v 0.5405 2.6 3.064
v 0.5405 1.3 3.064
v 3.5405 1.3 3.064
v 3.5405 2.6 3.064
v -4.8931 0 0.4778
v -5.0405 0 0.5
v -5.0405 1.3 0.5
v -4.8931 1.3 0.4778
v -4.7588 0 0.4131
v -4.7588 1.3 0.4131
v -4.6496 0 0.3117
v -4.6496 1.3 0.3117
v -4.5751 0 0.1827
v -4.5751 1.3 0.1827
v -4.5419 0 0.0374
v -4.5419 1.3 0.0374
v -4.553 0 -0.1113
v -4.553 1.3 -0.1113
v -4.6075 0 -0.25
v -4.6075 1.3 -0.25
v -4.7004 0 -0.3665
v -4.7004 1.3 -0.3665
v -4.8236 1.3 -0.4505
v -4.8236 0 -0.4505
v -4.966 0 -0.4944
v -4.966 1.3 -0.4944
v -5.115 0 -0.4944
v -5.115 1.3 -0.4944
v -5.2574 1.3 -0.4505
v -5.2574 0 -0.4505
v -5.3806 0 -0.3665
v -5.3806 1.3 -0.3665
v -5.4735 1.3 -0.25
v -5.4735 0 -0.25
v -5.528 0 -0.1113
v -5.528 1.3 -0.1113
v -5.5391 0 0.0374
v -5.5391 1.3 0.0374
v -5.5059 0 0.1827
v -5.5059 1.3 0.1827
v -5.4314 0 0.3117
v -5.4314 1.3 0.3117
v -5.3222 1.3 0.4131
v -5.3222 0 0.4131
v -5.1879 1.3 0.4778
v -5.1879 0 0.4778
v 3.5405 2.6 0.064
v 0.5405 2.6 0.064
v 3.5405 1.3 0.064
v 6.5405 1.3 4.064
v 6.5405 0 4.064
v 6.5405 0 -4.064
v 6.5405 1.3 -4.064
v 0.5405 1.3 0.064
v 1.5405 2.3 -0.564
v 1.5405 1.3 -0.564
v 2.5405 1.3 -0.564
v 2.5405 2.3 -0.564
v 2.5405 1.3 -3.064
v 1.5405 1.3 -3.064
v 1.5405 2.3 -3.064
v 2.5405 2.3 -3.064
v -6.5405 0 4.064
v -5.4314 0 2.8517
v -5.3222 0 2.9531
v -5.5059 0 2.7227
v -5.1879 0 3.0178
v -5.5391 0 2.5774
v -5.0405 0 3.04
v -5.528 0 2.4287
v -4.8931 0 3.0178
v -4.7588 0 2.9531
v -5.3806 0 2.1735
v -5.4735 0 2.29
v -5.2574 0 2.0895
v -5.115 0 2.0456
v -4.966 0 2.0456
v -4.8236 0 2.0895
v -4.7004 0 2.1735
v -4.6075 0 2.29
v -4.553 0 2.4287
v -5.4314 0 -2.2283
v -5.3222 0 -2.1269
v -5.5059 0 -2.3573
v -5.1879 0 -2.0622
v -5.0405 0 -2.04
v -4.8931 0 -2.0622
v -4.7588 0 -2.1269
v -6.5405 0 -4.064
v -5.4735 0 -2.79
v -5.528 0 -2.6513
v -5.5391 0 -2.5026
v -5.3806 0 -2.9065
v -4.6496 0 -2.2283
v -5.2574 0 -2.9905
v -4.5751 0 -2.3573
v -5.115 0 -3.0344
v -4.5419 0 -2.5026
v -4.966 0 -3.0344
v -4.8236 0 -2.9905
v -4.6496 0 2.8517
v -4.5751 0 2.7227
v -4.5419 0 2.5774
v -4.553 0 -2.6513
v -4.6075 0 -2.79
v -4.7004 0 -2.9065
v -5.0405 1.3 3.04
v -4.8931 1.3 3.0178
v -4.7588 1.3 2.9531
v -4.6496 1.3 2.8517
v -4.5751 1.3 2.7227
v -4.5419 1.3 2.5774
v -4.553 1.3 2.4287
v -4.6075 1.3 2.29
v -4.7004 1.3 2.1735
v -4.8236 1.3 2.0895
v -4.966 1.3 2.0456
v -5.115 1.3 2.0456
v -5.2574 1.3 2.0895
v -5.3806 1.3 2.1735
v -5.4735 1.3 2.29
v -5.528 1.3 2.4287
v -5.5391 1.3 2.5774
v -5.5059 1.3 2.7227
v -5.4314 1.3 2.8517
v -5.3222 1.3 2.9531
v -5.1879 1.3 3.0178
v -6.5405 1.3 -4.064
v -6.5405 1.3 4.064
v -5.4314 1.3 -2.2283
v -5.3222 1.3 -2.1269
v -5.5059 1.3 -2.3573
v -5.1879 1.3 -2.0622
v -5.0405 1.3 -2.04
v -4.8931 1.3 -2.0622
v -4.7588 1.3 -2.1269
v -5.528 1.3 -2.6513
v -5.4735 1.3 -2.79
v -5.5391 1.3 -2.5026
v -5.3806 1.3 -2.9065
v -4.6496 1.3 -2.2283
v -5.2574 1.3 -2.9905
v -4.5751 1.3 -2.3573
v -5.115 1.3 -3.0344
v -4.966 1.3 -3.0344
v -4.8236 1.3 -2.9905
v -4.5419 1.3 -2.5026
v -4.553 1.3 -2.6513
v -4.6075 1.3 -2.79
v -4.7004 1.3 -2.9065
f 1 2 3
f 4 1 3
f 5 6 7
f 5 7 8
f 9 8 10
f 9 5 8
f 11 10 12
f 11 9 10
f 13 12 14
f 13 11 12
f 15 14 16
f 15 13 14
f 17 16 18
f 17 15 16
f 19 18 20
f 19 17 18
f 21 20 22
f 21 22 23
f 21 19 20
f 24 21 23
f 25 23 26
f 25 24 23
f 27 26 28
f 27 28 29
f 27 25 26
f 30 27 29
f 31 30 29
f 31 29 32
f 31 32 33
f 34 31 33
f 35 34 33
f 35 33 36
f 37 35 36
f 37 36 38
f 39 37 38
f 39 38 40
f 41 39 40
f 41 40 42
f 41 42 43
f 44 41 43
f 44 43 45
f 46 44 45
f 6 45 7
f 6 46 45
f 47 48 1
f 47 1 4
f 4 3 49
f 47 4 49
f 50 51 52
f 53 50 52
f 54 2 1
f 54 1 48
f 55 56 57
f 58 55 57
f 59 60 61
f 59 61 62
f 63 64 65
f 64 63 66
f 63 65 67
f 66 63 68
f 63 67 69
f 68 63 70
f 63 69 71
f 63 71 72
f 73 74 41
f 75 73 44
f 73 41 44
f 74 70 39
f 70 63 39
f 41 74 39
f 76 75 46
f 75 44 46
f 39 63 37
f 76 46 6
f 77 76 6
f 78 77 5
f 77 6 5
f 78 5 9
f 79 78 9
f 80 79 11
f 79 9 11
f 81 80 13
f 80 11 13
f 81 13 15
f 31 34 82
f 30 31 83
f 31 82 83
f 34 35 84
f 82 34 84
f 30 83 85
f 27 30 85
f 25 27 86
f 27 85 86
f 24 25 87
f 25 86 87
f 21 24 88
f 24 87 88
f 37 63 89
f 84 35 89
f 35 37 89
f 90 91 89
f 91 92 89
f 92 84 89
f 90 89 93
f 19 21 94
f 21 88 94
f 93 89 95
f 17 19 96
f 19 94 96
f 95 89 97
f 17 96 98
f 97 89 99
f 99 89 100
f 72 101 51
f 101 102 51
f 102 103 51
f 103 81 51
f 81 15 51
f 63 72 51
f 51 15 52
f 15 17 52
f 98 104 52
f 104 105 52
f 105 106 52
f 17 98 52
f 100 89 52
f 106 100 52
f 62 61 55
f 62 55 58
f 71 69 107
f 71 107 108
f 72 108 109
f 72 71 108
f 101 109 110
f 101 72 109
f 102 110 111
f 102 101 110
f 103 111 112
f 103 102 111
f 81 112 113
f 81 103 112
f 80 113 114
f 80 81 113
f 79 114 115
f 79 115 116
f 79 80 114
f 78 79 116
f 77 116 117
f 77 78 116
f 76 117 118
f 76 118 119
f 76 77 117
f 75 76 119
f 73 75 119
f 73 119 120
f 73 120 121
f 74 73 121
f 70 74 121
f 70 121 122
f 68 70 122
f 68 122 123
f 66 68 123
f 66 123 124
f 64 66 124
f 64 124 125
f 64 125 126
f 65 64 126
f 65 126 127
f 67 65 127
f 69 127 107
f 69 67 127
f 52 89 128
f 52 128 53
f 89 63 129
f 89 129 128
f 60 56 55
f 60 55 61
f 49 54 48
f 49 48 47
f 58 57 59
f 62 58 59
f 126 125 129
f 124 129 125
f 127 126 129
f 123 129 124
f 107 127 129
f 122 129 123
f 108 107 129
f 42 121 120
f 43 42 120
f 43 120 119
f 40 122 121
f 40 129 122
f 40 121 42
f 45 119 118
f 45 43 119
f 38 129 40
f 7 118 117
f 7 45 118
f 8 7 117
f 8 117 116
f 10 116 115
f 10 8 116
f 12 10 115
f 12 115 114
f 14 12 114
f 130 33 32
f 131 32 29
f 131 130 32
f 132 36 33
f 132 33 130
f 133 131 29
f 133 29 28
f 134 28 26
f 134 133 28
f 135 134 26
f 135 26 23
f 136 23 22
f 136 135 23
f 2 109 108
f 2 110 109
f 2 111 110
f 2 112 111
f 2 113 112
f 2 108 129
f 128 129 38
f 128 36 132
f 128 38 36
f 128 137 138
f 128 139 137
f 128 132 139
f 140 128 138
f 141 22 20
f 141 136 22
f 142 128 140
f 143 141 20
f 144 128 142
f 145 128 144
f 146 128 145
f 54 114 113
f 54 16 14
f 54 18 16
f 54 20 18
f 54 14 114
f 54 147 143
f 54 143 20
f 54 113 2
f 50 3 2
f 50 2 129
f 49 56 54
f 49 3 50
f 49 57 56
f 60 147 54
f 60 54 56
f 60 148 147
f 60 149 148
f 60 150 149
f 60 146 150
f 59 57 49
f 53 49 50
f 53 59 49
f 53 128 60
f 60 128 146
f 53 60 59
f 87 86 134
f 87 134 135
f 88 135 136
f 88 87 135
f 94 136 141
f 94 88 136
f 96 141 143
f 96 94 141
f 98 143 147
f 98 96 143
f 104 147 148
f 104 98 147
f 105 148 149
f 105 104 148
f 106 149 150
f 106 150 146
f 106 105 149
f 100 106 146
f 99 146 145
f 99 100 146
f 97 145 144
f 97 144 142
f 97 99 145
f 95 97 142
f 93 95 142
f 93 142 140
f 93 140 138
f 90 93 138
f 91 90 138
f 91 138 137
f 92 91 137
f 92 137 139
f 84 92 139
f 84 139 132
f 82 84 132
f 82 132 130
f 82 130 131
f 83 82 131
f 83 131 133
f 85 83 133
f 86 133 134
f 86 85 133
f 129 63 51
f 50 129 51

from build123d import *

# Parameters (mm, degrees)
SKETCH1_W           = 13.081
SKETCH1_H           = 8.128
SKETCH1_R           = 0.5
BOSS_EXTRUDE1_DEPTH = 1.3
SKETCH2_W           = 3
SKETCH2_H           = 3
BOSS_EXTRUDE2_DEPTH = 1.3
SKETCH3_W           = 1
SKETCH3_H           = 2.5
BOSS_EXTRUDE3_DEPTH = 1


with BuildPart() as part:
    # Sketch1 → Boss-Extrude1 (new body)
    with BuildSketch(Plane(origin=(0, 0, 0), x_dir=(1, 0, 0), z_dir=(0, 1, 0))):
        Rectangle(SKETCH1_W, SKETCH1_H)
        with Locations(Location((-5.0405, 2.54, 0), (0, 0, 270))):
            Circle(SKETCH1_R, mode=Mode.SUBTRACT)
        with Locations(Location((-5.0405, 0, 0), (0, 0, 270))):
            Circle(SKETCH1_R, mode=Mode.SUBTRACT)
        with Locations(Location((-5.0405, -2.54, 0), (0, 0, 270))):
            Circle(SKETCH1_R, mode=Mode.SUBTRACT)
    extrude(amount=BOSS_EXTRUDE1_DEPTH)

    # Sketch2 → Boss-Extrude2 (add)
    with BuildSketch(Plane(origin=(0, 1.3, 0), x_dir=(1, 0, 0), z_dir=(0, 1, 0))):
        with Locations((2.0405, -1.564)):
            Rectangle(SKETCH2_W, SKETCH2_H)
    extrude(amount=BOSS_EXTRUDE2_DEPTH)

    # Sketch3 → Boss-Extrude3 (add)
    with BuildSketch(Plane(origin=(0, 1.3, 0), x_dir=(1, 0, 0), z_dir=(0, 1, 0))):
        with Locations((2.0405, 1.814)):
            Rectangle(SKETCH3_W, SKETCH3_H)
    extrude(amount=BOSS_EXTRUDE3_DEPTH)


solid = part.part
